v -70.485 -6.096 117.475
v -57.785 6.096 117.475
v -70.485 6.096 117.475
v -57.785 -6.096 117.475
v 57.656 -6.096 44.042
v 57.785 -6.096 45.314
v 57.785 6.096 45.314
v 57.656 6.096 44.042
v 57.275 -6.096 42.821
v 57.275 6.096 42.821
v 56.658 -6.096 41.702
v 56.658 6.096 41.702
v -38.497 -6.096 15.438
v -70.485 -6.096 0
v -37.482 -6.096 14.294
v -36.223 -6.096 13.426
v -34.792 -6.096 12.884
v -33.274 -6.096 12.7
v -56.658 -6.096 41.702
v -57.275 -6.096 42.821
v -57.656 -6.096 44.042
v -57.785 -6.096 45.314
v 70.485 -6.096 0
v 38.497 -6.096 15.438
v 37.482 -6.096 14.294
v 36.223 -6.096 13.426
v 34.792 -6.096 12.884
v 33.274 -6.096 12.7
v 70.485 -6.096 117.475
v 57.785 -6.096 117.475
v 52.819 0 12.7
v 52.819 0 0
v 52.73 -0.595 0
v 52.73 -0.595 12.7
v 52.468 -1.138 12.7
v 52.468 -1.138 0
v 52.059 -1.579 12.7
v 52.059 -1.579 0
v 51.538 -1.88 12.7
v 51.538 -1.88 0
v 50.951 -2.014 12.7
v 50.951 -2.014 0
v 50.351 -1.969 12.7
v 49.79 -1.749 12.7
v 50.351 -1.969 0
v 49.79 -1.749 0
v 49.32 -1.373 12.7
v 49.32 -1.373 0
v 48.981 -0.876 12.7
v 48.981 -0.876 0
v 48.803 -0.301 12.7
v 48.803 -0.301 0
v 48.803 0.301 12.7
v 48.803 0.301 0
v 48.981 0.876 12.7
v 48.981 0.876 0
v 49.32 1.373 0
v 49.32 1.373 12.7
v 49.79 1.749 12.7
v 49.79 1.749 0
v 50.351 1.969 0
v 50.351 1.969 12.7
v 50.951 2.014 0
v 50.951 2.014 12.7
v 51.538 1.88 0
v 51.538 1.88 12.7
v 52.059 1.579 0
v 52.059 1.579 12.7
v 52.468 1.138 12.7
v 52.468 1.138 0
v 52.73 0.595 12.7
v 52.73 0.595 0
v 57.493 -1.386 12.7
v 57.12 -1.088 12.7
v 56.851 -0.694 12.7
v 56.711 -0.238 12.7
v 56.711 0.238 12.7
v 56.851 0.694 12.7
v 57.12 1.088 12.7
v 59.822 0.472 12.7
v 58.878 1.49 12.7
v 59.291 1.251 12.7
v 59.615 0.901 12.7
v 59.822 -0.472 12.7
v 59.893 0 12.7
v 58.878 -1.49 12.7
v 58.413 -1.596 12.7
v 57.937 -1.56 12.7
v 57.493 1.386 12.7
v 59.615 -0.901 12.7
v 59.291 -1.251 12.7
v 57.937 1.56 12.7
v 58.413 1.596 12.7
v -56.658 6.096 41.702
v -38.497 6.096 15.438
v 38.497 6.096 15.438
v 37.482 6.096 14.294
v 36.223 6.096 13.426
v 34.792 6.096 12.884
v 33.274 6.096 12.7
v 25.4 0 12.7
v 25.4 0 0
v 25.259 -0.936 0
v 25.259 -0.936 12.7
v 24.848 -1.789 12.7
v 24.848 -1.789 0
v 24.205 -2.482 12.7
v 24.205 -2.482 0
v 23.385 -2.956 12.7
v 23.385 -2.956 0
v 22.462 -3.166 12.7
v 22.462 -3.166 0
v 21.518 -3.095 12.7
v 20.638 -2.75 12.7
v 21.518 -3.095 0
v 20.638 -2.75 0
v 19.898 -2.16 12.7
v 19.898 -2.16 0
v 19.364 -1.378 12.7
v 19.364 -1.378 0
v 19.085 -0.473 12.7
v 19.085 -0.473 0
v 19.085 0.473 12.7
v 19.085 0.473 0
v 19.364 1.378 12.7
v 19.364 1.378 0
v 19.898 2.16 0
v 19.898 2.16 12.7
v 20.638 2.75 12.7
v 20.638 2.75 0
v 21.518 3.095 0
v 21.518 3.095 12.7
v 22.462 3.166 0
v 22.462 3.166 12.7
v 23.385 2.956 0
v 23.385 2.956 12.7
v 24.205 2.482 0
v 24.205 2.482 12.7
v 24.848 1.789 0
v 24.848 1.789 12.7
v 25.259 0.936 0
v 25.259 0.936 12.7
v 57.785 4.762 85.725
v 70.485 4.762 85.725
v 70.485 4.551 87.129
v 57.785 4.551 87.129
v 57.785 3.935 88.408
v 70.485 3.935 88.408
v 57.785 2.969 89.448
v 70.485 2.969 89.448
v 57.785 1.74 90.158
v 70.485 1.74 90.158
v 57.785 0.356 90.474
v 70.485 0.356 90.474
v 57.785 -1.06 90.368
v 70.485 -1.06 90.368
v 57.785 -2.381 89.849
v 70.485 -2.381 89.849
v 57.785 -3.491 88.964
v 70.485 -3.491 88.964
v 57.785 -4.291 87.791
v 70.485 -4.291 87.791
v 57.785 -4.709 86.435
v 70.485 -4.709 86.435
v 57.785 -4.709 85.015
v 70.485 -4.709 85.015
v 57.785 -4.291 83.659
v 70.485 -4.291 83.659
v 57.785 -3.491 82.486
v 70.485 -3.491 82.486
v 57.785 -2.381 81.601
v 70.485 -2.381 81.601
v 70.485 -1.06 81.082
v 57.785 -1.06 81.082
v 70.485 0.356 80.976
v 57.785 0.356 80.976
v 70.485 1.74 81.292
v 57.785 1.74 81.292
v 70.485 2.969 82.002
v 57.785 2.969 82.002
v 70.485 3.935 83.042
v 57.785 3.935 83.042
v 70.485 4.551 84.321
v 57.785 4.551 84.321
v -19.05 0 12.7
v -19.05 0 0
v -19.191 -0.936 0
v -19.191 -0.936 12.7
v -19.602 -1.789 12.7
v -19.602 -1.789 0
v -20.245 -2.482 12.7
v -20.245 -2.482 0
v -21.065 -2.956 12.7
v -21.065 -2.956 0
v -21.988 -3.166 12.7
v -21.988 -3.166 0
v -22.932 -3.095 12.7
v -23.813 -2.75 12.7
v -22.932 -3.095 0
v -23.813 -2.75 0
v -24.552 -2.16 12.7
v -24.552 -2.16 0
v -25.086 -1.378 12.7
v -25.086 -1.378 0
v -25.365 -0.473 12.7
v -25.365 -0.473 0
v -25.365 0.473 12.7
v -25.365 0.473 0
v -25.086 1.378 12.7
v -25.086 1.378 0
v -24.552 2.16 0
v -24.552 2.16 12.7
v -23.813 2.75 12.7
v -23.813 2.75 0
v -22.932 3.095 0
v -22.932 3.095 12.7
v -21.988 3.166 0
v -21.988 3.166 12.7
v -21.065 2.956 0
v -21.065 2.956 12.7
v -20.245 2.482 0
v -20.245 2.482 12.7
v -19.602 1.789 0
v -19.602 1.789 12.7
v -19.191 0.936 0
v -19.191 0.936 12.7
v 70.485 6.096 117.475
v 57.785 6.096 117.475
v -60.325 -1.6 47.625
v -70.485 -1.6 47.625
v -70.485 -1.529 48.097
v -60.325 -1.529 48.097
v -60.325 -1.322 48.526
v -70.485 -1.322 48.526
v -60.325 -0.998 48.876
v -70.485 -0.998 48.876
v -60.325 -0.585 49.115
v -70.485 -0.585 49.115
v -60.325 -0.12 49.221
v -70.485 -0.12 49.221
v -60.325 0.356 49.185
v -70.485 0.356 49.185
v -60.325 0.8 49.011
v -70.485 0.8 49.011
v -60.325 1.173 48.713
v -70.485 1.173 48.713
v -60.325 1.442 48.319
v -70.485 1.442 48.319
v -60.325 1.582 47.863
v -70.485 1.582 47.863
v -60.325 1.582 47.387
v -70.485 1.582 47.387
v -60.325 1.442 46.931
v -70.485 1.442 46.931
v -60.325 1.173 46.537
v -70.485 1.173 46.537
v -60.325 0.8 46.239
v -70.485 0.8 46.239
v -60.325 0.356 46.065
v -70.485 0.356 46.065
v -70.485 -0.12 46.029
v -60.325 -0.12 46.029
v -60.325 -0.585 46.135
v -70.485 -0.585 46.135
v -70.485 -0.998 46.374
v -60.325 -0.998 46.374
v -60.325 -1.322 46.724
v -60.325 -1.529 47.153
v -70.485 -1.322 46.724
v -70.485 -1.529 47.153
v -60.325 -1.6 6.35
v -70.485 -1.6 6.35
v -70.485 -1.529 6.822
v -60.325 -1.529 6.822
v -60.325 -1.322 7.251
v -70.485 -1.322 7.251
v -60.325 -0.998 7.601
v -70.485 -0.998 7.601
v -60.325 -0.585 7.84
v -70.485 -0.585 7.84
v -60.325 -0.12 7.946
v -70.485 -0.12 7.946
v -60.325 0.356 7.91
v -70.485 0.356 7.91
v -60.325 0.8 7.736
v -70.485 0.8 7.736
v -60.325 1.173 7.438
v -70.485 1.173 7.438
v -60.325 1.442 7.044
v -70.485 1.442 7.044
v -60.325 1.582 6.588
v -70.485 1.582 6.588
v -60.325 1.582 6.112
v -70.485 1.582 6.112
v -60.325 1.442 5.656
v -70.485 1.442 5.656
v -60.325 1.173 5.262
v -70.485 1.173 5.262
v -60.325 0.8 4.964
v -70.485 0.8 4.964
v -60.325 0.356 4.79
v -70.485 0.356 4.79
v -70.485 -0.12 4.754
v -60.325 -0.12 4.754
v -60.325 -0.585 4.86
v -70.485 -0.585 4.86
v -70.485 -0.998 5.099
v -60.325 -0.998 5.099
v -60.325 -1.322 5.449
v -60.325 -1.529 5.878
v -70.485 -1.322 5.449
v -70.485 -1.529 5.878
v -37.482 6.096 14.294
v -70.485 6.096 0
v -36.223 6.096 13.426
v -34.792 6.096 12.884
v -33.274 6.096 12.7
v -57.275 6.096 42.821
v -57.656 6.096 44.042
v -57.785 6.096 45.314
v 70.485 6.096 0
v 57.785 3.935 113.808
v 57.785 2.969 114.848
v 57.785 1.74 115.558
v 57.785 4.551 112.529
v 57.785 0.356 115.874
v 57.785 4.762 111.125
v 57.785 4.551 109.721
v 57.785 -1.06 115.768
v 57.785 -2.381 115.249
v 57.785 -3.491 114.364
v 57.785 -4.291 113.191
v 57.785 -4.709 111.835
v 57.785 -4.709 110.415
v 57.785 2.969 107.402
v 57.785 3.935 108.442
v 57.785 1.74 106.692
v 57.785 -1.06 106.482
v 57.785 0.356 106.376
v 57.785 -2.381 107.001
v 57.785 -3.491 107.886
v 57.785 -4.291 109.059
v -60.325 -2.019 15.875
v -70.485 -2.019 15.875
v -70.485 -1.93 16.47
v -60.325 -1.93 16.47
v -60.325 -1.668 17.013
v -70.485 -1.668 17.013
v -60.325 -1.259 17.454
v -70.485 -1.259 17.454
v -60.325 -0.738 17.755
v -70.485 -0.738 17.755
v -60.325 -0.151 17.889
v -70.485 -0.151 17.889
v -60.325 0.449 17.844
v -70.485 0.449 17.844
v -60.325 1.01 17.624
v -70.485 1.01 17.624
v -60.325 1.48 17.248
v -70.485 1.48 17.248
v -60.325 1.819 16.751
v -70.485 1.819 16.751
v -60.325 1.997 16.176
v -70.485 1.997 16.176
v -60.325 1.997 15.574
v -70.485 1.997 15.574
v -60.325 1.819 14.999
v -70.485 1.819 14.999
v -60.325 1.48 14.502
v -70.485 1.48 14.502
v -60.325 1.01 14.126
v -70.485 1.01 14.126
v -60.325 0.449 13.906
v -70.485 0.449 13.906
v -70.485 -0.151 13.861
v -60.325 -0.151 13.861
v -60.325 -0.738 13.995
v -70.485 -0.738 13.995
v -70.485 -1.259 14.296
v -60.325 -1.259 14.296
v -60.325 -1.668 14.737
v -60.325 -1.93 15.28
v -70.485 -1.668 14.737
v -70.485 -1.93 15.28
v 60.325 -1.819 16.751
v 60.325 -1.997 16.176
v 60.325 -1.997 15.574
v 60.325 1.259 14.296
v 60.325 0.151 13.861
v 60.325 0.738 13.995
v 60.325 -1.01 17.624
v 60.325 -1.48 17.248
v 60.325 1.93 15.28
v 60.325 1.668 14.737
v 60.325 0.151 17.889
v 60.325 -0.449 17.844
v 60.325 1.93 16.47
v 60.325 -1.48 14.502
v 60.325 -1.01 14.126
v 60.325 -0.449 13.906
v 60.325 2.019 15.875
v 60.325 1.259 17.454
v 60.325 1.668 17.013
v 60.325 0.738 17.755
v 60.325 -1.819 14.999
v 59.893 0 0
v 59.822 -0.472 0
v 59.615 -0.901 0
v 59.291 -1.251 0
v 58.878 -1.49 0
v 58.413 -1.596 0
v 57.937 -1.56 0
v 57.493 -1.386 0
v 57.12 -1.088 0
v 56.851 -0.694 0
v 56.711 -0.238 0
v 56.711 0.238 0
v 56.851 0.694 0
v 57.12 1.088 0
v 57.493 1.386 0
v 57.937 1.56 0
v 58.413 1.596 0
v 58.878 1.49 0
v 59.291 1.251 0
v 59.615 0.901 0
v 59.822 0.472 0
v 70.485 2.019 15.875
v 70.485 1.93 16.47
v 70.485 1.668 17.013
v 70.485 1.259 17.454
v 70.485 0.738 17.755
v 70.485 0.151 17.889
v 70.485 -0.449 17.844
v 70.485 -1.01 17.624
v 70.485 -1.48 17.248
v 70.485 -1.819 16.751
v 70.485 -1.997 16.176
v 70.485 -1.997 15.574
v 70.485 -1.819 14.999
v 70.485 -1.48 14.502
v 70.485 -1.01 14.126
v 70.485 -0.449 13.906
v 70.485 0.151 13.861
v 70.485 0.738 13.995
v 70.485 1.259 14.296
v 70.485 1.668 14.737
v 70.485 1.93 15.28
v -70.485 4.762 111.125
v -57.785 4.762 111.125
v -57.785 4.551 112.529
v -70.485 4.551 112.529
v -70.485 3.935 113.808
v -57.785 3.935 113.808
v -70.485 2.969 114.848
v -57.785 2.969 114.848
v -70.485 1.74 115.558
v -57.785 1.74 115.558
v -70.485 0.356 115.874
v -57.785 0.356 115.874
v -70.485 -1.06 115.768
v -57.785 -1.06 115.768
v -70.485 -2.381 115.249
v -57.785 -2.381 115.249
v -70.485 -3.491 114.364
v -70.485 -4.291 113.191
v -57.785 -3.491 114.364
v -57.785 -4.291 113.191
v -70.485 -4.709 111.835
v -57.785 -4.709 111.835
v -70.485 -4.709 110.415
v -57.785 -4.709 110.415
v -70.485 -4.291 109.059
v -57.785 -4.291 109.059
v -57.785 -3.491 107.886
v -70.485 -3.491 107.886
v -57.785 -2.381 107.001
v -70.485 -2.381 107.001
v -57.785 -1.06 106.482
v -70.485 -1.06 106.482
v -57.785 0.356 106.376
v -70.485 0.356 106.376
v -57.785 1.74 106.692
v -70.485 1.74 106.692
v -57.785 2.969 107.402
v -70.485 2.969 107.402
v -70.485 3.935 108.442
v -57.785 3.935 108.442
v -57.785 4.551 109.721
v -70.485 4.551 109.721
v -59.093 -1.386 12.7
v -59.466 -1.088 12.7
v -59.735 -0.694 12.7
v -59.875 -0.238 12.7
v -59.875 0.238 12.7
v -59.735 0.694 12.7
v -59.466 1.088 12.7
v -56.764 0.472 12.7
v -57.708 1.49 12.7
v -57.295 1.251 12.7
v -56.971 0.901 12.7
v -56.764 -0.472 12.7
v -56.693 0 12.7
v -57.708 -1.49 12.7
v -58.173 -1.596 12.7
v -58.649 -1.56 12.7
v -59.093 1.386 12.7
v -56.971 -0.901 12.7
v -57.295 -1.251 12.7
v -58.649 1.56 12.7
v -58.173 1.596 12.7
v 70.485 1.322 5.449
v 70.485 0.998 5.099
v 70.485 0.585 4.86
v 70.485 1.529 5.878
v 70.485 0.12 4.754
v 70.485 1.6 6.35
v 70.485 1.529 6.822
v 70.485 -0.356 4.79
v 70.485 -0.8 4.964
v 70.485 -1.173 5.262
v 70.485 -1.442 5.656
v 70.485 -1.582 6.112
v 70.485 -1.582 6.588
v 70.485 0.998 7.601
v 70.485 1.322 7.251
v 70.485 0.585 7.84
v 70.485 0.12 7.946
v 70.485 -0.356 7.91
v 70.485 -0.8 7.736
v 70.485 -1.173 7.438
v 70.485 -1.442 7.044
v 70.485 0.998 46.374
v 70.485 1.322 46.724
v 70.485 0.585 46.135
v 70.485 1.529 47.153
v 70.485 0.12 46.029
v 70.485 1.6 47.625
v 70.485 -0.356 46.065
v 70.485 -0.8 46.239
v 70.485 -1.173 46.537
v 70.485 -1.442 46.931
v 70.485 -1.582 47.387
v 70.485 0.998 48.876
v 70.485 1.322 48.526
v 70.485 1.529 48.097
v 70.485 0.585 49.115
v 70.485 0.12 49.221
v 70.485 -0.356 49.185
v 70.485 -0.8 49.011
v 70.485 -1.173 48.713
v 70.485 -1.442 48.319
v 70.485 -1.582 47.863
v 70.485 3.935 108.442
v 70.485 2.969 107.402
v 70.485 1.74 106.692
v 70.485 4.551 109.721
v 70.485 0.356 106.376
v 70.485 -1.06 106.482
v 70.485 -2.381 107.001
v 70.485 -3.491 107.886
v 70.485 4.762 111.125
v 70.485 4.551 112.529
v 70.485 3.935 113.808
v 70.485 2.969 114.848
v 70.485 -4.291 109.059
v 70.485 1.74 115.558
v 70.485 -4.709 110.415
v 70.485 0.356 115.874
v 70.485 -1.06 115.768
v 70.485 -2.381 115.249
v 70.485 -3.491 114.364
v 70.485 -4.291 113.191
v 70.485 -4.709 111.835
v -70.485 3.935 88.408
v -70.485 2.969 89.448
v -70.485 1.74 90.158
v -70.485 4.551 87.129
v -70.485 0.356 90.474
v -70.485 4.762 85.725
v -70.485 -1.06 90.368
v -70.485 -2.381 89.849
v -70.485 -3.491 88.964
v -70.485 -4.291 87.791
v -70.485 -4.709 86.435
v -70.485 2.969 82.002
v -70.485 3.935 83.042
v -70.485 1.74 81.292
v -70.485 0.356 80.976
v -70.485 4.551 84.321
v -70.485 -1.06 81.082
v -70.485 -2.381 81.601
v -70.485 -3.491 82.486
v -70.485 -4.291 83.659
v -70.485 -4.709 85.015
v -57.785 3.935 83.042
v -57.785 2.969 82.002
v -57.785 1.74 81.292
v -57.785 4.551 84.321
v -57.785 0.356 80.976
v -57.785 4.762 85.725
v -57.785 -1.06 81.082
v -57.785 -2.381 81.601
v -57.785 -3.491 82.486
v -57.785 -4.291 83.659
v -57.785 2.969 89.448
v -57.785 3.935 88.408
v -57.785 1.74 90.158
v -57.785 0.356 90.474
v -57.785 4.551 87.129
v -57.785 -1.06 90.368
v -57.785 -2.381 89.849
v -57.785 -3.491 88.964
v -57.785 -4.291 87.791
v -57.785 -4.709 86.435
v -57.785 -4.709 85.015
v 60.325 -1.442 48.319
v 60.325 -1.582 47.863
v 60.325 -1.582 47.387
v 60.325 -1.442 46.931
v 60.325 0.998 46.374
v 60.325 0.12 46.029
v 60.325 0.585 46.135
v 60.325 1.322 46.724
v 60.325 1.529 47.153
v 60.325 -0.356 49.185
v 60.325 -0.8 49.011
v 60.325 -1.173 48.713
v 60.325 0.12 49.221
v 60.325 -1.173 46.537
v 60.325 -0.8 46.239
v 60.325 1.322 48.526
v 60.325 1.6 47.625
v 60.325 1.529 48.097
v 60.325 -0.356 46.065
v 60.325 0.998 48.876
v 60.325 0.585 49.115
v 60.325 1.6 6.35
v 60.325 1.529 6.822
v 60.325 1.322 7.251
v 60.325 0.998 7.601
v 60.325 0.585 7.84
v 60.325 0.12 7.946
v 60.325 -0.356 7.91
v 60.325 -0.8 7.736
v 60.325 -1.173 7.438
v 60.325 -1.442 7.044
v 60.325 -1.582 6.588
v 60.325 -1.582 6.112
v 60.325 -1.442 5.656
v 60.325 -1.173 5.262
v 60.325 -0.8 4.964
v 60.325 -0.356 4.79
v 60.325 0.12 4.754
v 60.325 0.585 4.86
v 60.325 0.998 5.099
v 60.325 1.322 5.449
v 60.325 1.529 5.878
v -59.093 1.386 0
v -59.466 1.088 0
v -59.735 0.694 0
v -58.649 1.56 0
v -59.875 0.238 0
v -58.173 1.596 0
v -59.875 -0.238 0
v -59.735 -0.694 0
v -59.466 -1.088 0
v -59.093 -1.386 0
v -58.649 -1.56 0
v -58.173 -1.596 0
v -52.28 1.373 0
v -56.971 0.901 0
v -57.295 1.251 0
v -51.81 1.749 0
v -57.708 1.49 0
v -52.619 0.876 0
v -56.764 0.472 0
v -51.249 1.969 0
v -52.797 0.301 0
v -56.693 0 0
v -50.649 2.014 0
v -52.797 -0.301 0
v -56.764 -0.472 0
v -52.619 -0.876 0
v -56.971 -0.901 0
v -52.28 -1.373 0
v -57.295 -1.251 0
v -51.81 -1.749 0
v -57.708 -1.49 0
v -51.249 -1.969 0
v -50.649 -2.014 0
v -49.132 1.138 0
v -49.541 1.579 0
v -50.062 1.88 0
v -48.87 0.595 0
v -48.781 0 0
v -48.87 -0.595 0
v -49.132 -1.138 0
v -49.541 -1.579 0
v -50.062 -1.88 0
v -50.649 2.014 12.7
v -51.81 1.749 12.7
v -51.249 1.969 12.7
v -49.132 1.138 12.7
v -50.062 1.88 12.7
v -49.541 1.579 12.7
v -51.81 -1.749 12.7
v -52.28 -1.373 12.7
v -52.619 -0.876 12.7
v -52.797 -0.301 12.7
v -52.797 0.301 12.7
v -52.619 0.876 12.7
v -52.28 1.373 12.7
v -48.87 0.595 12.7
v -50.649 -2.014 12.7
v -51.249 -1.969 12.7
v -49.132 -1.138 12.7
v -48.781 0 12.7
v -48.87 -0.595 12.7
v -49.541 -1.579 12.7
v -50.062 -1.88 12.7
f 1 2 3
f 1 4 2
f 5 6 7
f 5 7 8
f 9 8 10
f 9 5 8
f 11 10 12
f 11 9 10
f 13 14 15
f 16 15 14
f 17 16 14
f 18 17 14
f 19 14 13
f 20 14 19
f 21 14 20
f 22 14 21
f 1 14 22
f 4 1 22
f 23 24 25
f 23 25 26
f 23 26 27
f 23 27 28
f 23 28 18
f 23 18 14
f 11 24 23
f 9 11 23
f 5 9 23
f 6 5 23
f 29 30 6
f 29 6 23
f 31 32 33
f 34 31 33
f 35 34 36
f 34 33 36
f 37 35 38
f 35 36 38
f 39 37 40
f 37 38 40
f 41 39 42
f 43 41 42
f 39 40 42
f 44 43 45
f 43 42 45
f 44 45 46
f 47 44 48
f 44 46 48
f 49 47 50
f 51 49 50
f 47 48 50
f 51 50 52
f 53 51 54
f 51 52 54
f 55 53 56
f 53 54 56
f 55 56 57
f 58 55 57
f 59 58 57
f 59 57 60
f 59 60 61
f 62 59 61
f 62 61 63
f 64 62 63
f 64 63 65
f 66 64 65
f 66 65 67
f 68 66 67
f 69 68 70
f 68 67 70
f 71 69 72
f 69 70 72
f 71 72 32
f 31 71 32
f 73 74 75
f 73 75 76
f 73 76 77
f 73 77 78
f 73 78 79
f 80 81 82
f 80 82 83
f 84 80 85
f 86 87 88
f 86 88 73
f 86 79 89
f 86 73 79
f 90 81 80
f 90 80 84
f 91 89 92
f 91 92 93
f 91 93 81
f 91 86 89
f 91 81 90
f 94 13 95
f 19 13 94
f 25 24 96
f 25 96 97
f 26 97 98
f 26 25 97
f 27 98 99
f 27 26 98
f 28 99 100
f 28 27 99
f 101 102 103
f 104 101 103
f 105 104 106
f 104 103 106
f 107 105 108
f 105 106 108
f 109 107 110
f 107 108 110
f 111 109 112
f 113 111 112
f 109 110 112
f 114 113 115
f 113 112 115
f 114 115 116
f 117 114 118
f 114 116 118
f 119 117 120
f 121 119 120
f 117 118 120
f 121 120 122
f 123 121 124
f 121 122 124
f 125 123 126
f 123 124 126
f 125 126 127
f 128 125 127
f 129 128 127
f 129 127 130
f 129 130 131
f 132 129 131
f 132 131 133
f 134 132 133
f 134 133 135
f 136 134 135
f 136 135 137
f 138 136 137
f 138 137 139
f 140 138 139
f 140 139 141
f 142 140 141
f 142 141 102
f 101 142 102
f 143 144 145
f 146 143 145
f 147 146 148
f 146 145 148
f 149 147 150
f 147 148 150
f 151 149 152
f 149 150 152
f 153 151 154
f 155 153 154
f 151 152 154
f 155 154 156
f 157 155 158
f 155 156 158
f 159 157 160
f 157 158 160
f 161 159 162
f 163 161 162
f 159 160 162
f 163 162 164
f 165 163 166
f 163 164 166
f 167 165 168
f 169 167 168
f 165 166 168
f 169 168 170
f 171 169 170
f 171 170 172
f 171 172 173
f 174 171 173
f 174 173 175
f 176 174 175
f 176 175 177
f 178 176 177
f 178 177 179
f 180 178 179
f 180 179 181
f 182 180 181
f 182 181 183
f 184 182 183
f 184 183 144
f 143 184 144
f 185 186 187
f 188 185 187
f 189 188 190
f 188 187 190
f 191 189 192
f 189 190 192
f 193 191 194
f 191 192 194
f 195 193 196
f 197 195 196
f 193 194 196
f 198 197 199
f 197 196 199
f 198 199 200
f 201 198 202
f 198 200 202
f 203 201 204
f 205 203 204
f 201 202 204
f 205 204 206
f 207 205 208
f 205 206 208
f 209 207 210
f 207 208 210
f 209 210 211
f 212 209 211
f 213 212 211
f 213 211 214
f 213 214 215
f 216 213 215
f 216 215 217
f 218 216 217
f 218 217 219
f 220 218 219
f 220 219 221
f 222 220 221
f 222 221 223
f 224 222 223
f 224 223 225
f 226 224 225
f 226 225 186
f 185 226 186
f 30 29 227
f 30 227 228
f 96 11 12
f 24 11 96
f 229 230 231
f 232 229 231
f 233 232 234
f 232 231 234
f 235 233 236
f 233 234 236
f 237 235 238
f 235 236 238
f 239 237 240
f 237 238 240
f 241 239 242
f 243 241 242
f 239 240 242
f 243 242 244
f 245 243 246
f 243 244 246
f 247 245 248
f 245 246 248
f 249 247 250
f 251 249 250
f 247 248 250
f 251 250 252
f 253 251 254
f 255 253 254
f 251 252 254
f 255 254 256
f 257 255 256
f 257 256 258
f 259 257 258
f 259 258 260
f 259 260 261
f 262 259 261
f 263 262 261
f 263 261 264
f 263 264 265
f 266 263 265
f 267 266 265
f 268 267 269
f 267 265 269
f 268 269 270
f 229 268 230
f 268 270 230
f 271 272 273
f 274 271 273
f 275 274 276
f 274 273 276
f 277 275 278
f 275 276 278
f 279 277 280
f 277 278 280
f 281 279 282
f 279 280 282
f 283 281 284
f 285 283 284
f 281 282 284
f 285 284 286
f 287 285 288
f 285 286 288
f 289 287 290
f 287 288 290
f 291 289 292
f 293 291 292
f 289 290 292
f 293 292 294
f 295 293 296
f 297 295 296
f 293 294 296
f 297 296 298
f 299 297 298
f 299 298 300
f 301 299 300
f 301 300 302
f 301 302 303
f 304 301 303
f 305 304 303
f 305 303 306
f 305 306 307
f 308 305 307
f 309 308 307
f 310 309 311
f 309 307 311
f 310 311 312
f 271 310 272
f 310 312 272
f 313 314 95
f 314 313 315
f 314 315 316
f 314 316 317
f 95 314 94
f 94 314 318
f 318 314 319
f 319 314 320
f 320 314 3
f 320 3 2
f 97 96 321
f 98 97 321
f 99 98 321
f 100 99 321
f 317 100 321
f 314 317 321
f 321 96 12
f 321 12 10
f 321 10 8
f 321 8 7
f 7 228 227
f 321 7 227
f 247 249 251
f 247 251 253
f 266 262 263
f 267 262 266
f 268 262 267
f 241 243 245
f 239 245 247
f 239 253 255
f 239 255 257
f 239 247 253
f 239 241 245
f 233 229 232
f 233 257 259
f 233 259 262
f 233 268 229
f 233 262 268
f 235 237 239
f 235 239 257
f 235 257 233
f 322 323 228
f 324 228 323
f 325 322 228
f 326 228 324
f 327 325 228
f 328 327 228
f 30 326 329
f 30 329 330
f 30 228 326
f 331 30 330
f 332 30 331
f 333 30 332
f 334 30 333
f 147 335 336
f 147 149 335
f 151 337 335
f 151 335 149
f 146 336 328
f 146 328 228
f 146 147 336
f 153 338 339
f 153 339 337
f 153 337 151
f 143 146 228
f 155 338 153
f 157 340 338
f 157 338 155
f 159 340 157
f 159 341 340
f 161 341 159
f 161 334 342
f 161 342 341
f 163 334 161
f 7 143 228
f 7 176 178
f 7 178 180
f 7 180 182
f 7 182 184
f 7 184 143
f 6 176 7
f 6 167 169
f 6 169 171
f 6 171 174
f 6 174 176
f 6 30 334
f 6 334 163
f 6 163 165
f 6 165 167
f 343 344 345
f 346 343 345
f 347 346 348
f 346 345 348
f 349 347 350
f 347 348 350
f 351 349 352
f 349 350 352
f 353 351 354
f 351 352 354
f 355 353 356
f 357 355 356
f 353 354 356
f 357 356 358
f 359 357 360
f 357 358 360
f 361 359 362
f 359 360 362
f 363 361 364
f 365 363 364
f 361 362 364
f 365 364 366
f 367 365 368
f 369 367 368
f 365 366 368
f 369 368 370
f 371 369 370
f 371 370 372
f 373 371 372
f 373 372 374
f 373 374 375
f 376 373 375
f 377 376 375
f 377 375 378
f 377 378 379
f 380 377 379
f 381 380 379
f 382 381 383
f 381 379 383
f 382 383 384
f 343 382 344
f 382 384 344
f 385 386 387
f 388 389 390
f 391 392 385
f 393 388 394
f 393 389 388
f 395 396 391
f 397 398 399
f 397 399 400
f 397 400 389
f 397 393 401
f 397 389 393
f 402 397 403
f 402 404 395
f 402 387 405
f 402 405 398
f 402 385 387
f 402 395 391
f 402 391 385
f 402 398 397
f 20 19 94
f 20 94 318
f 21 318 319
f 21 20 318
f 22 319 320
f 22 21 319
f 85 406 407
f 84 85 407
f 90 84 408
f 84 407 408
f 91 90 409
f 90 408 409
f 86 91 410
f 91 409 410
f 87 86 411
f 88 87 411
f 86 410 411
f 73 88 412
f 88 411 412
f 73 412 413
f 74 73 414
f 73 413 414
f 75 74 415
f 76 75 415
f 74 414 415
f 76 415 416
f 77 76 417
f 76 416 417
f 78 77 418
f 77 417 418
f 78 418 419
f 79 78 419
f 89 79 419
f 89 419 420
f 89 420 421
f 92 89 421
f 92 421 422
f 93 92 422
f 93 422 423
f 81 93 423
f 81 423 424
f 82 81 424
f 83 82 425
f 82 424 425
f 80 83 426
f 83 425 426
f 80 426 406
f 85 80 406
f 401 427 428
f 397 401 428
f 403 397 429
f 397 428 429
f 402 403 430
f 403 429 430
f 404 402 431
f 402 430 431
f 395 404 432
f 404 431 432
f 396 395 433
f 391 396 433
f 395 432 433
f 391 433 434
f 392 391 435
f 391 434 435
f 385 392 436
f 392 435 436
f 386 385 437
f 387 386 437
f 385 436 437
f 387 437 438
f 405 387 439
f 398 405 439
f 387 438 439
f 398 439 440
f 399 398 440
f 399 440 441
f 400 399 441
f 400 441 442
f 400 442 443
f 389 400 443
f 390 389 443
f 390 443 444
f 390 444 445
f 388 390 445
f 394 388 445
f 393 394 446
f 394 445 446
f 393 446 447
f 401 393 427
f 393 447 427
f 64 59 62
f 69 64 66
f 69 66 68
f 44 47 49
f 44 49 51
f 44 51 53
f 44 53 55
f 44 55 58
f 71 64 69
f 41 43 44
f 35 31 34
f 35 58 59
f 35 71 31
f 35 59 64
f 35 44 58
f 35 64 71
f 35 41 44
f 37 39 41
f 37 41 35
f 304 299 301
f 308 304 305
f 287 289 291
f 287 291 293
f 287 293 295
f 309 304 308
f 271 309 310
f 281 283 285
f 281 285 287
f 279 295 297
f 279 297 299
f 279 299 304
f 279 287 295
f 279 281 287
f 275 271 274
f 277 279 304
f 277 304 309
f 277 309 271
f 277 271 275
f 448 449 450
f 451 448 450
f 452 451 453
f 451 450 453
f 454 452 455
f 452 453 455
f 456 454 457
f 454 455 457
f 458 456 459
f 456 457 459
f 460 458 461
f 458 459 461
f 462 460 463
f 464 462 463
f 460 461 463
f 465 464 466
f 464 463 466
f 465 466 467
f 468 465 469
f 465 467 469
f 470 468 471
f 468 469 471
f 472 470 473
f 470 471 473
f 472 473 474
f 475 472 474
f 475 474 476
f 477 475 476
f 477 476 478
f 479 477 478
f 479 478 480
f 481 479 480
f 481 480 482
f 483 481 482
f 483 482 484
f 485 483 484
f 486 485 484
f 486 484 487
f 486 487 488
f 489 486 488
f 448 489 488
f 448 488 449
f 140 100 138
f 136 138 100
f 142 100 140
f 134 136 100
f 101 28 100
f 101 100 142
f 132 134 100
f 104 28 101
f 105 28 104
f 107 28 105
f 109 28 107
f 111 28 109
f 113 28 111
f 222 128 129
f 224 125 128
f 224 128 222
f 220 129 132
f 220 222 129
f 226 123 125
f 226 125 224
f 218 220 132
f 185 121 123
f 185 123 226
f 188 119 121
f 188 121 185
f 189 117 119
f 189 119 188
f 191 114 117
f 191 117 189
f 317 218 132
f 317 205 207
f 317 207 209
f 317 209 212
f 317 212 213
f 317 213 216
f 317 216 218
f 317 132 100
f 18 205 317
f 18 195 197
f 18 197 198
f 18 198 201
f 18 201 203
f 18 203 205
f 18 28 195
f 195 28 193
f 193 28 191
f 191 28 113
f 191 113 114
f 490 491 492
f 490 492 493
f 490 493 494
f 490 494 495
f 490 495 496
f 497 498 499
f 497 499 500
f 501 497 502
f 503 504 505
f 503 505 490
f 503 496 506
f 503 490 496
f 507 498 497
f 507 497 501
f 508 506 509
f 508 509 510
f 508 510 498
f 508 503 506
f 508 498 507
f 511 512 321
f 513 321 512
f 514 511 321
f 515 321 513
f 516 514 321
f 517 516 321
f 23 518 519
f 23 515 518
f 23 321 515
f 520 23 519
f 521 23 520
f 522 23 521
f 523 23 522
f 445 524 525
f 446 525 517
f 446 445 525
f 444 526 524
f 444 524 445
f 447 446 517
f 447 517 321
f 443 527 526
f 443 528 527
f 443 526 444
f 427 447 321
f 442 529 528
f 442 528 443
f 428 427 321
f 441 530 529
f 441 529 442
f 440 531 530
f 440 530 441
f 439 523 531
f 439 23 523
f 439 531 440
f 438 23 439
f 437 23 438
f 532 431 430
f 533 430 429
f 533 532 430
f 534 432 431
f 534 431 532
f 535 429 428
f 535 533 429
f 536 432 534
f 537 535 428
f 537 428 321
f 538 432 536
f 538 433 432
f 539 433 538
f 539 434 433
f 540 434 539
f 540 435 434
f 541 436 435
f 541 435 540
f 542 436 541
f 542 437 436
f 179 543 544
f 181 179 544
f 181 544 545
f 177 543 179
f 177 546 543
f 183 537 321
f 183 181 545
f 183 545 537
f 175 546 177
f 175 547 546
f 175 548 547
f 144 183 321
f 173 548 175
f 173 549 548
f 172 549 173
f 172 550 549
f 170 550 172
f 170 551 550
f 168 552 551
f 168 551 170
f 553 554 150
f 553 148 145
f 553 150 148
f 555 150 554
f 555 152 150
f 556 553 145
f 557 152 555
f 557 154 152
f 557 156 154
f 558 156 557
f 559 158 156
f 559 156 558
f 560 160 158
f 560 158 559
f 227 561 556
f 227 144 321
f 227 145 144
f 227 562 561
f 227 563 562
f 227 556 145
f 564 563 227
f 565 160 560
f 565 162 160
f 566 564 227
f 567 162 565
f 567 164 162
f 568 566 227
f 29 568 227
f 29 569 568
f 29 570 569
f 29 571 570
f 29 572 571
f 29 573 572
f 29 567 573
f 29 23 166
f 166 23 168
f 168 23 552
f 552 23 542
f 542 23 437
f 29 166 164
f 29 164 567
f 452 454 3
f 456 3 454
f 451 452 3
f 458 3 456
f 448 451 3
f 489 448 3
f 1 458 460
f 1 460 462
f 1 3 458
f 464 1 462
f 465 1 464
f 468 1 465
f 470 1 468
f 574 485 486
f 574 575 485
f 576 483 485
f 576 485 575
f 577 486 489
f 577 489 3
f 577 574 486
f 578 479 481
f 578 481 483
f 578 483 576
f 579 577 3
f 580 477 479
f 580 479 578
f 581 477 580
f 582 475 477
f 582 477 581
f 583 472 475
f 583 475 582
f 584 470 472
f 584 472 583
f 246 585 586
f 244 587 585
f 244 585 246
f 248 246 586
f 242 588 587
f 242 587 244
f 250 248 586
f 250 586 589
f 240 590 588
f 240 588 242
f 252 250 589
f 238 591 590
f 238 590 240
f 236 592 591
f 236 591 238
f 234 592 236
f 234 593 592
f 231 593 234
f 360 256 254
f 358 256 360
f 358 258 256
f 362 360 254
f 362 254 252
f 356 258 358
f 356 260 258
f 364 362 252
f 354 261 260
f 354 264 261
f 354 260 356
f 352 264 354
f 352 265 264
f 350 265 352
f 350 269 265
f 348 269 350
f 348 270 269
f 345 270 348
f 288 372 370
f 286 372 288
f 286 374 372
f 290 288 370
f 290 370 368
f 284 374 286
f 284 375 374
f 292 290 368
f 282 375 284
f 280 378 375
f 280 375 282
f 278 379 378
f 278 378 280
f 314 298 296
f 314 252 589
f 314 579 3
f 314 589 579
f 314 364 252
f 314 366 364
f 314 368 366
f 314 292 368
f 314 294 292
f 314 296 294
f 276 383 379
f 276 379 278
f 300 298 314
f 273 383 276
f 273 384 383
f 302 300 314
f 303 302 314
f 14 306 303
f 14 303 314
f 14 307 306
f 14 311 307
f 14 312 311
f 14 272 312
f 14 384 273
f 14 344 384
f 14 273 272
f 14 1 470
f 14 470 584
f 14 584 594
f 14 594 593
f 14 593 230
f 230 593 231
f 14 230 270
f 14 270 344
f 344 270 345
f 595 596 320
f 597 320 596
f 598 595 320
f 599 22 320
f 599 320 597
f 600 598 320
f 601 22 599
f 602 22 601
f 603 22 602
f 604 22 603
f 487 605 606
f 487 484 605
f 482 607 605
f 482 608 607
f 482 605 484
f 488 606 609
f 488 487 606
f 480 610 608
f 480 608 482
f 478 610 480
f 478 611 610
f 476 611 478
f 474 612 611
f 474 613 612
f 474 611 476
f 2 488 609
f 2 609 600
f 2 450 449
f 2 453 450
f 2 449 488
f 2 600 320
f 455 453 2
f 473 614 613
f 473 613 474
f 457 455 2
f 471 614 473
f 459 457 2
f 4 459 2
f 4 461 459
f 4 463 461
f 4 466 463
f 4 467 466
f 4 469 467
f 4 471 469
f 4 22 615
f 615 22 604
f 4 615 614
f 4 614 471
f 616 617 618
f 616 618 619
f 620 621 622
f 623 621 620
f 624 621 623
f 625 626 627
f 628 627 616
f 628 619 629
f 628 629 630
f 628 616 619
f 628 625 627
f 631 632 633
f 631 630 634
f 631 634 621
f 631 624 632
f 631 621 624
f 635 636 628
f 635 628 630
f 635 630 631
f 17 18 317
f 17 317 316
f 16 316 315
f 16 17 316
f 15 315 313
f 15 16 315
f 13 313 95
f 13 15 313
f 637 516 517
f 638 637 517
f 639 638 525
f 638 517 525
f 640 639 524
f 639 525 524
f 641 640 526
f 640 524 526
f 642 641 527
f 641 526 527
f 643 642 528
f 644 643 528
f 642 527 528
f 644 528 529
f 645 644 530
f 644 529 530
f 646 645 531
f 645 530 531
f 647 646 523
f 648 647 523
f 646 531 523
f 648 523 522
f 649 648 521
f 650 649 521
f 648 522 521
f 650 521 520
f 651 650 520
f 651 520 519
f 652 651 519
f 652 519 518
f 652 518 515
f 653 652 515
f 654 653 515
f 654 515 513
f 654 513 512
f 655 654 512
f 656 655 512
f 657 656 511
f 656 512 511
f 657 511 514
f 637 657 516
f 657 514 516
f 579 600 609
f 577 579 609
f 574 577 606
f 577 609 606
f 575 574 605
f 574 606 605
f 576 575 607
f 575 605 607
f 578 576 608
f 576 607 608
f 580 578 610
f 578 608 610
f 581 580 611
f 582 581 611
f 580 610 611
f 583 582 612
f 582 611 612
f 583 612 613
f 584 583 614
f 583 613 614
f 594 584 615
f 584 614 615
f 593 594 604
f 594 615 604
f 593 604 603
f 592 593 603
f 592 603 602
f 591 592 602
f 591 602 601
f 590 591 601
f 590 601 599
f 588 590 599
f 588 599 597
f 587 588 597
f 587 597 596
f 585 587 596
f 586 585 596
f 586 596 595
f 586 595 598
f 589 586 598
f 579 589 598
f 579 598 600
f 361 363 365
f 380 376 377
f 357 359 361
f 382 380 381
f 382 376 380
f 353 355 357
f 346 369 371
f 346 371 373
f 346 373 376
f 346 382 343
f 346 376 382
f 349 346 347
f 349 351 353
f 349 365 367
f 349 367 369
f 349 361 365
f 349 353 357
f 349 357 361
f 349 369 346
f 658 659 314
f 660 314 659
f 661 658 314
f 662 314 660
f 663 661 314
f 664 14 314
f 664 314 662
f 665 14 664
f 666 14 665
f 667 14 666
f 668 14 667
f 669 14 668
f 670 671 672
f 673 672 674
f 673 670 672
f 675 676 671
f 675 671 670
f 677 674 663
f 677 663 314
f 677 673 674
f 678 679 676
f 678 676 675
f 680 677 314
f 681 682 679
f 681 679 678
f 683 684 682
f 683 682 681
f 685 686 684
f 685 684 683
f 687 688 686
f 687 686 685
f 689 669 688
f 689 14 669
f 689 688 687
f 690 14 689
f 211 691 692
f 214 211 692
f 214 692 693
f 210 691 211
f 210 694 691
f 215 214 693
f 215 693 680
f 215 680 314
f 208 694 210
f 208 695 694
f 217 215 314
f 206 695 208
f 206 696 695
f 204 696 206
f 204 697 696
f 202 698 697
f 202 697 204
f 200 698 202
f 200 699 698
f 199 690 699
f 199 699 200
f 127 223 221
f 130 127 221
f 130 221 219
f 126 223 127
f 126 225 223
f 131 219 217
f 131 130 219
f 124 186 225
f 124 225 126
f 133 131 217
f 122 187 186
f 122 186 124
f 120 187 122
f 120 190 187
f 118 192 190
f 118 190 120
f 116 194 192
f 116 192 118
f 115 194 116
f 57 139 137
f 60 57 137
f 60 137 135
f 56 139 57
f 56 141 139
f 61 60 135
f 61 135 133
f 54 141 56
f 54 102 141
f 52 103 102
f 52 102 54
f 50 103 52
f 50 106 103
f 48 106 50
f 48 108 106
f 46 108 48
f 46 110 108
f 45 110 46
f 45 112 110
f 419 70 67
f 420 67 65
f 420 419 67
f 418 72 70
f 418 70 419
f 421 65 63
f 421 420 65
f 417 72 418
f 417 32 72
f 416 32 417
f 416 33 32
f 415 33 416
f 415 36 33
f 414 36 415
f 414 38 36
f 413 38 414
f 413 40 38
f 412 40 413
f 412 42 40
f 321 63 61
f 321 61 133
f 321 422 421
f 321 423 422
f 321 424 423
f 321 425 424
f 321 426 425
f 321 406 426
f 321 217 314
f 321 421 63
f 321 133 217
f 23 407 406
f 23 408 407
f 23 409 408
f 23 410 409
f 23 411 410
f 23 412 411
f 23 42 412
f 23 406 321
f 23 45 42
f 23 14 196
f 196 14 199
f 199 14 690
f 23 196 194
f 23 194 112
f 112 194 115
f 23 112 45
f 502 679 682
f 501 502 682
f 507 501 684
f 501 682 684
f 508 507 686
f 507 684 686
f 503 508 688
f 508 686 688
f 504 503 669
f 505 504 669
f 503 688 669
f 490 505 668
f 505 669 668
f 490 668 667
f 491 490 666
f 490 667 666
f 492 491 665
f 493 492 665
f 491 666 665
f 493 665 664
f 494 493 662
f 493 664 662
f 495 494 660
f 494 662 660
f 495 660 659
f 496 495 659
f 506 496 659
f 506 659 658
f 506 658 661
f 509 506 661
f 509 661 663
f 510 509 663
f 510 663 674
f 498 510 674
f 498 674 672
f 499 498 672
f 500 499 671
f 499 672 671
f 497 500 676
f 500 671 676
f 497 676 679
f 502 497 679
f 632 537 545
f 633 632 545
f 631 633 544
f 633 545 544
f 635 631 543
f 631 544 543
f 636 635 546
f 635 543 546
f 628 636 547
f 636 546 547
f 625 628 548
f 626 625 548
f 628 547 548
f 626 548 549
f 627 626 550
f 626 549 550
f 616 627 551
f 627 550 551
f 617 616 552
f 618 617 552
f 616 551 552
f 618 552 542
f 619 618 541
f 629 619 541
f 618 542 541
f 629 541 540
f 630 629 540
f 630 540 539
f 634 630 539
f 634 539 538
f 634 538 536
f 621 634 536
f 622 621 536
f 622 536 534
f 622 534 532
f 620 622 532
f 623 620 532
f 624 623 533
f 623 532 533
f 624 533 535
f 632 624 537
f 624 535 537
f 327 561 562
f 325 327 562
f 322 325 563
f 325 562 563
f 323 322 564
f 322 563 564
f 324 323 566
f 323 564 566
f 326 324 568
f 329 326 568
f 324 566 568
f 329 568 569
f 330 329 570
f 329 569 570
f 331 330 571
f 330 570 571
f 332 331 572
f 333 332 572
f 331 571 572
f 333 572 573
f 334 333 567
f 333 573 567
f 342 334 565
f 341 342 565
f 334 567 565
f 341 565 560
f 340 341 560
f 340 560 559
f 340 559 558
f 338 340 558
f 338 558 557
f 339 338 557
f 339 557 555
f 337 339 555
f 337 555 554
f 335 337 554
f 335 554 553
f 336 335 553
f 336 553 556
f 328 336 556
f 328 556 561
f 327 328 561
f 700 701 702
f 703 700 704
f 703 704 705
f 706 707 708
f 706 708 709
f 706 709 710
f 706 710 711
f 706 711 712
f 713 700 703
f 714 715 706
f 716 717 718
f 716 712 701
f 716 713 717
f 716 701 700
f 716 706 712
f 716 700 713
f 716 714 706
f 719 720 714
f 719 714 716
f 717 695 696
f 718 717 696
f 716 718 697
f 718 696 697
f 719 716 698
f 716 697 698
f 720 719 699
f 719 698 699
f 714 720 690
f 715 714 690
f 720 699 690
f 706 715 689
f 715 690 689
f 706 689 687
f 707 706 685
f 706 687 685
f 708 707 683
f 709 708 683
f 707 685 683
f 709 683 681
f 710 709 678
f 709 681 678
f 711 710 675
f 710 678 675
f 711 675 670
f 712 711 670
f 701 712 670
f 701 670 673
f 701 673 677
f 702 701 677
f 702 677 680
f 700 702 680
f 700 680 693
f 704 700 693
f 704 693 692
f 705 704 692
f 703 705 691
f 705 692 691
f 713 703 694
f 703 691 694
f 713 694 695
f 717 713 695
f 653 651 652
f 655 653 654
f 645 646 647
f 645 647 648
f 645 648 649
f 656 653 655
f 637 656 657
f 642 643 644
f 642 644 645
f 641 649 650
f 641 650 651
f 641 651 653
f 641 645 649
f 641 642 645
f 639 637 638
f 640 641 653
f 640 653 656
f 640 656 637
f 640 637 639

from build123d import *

# Parameters (mm, degrees)
F1_DEPTH  = 6.096
F2_R      = 4.7625
F3_DEPTH  = 140.971
F4_R      = 3.175
F5_DEPTH  = 117.476
F6_R      = 2.0193
F6_R_2    = 1.6002
F7_DEPTH  = 12.7
F8_R      = 1.6002
F8_R_2    = 2.0193
F9_DEPTH  = 10.16
F10_R     = 1.6002
F10_R_2   = 2.0193
F11_DEPTH = 10.16


with BuildPart() as f1:
    # F0 (on Front) → F1 (new body, symmetric)
    with BuildSketch(Plane.XZ):
        with BuildLine():
            Line((-70.485, 0), (0, 0))
            Line((0, 0), (70.485, 0))
            Line((70.485, 0), (70.485, 117.475))
            Line((70.485, 117.475), (57.785, 117.475))
            Line((57.785, 117.475), (57.785, 45.3136))
            ThreePointArc((57.785, 45.3136), (57.4966846366, 43.4219130898), (56.6579198847, 41.7020064627))
            Line((56.6579198847, 41.7020064627), (38.4969198847, 15.4384064627))
            ThreePointArc((38.4969198847, 15.4384064627), (36.2226336699, 13.426117046), (33.274, 12.7))
            Line((33.274, 12.7), (0, 12.7))
            Line((0, 12.7), (-33.274, 12.7))
            ThreePointArc((-33.274, 12.7), (-36.2226336699, 13.426117046), (-38.4969198847, 15.4384064627))
            Line((-38.4969198847, 15.4384064627), (-56.6579198847, 41.7020064627))
            ThreePointArc((-56.6579198847, 41.7020064627), (-57.4966846366, 43.4219130898), (-57.785, 45.3136))
            Line((-57.785, 45.3136), (-57.785, 117.475))
            Line((-57.785, 117.475), (-70.485, 117.475))
            Line((-70.485, 117.475), (-70.485, 0))
        make_face()
    extrude(amount=F1_DEPTH, both=True)

    # F2 (on face) → F3 (cut, through all)
    with BuildSketch(Plane.YZ.offset(70.485)):
        with Locations((0, 111.125)):
            Circle(F2_R)
        with Locations((0, 85.725)):
            Circle(F2_R)
    extrude(amount=-F3_DEPTH, mode=Mode.SUBTRACT)

    # F4 (on face) → F5 (cut, through all)
    with BuildSketch(Plane(origin=(0, 0, 0), x_dir=(1, 0, 0), z_dir=(0, 0, -1))):
        with Locations((-22.225, 0)):
            Circle(F4_R)
        with Locations((22.225, 0)):
            Circle(F4_R)
    extrude(amount=-F5_DEPTH, mode=Mode.SUBTRACT)

    # F6 (on face) → F7 (cut)
    with BuildSketch(Plane(origin=(0, 0, 0), x_dir=(1, 0, 0), z_dir=(0, 0, -1))):
        with Locations((-50.8, 0)):
            Circle(F6_R)
        with Locations((-58.293, 0)):
            Circle(F6_R_2)
        with Locations((50.8, 0)):
            Circle(F6_R)
        with Locations((58.293, 0)):
            Circle(F6_R_2)
    extrude(amount=-F7_DEPTH, mode=Mode.SUBTRACT)

    # F8 (on face) → F9 (cut)
    with BuildSketch(Plane.YZ.offset(70.485)):
        with Locations((0, 6.35)):
            Circle(F8_R)
        with Locations((0, 47.625)):
            Circle(F8_R)
        with Locations((0, 15.875)):
            Circle(F8_R_2)
    extrude(amount=-F9_DEPTH, mode=Mode.SUBTRACT)

    # F10 (on face) → F11 (cut)
    with BuildSketch(Plane(origin=(-70.485, 0, 0), x_dir=(0, -1, 0), z_dir=(-1, 0, 0))):
        with Locations((0, 6.35)):
            Circle(F10_R)
        with Locations((0, 15.875)):
            Circle(F10_R_2)
        with Locations((0, 47.625)):
            Circle(F10_R)
    extrude(amount=-F11_DEPTH, mode=Mode.SUBTRACT)


solid = f1.part
